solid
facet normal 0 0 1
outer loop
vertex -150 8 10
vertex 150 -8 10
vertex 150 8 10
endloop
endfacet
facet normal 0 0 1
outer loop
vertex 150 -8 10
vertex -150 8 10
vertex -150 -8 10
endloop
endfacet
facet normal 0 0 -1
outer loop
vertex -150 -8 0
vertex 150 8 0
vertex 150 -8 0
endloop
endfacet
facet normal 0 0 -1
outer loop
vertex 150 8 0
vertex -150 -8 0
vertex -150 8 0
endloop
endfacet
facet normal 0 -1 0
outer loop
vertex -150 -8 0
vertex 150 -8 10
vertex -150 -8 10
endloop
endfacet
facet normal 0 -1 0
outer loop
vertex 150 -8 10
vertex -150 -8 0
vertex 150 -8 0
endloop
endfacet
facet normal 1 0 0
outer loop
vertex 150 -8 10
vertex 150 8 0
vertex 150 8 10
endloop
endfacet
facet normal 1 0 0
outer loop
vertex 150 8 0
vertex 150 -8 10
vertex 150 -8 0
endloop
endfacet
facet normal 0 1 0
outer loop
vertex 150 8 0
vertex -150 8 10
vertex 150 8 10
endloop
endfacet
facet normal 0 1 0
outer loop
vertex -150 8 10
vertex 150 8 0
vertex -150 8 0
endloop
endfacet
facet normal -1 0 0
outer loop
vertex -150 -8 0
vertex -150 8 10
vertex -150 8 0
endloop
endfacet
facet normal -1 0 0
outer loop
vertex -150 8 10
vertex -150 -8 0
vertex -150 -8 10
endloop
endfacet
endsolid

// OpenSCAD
// === RECTANGULAR PIN PARAMETERS ===
pin_length = 300;
pin_width = 16;
pin_height = 10;

// Center it on X/Y and sit on Z=0
translate([-pin_length/2, -pin_width/2, 0])
    cube([pin_length, pin_width, pin_height], center = false);
